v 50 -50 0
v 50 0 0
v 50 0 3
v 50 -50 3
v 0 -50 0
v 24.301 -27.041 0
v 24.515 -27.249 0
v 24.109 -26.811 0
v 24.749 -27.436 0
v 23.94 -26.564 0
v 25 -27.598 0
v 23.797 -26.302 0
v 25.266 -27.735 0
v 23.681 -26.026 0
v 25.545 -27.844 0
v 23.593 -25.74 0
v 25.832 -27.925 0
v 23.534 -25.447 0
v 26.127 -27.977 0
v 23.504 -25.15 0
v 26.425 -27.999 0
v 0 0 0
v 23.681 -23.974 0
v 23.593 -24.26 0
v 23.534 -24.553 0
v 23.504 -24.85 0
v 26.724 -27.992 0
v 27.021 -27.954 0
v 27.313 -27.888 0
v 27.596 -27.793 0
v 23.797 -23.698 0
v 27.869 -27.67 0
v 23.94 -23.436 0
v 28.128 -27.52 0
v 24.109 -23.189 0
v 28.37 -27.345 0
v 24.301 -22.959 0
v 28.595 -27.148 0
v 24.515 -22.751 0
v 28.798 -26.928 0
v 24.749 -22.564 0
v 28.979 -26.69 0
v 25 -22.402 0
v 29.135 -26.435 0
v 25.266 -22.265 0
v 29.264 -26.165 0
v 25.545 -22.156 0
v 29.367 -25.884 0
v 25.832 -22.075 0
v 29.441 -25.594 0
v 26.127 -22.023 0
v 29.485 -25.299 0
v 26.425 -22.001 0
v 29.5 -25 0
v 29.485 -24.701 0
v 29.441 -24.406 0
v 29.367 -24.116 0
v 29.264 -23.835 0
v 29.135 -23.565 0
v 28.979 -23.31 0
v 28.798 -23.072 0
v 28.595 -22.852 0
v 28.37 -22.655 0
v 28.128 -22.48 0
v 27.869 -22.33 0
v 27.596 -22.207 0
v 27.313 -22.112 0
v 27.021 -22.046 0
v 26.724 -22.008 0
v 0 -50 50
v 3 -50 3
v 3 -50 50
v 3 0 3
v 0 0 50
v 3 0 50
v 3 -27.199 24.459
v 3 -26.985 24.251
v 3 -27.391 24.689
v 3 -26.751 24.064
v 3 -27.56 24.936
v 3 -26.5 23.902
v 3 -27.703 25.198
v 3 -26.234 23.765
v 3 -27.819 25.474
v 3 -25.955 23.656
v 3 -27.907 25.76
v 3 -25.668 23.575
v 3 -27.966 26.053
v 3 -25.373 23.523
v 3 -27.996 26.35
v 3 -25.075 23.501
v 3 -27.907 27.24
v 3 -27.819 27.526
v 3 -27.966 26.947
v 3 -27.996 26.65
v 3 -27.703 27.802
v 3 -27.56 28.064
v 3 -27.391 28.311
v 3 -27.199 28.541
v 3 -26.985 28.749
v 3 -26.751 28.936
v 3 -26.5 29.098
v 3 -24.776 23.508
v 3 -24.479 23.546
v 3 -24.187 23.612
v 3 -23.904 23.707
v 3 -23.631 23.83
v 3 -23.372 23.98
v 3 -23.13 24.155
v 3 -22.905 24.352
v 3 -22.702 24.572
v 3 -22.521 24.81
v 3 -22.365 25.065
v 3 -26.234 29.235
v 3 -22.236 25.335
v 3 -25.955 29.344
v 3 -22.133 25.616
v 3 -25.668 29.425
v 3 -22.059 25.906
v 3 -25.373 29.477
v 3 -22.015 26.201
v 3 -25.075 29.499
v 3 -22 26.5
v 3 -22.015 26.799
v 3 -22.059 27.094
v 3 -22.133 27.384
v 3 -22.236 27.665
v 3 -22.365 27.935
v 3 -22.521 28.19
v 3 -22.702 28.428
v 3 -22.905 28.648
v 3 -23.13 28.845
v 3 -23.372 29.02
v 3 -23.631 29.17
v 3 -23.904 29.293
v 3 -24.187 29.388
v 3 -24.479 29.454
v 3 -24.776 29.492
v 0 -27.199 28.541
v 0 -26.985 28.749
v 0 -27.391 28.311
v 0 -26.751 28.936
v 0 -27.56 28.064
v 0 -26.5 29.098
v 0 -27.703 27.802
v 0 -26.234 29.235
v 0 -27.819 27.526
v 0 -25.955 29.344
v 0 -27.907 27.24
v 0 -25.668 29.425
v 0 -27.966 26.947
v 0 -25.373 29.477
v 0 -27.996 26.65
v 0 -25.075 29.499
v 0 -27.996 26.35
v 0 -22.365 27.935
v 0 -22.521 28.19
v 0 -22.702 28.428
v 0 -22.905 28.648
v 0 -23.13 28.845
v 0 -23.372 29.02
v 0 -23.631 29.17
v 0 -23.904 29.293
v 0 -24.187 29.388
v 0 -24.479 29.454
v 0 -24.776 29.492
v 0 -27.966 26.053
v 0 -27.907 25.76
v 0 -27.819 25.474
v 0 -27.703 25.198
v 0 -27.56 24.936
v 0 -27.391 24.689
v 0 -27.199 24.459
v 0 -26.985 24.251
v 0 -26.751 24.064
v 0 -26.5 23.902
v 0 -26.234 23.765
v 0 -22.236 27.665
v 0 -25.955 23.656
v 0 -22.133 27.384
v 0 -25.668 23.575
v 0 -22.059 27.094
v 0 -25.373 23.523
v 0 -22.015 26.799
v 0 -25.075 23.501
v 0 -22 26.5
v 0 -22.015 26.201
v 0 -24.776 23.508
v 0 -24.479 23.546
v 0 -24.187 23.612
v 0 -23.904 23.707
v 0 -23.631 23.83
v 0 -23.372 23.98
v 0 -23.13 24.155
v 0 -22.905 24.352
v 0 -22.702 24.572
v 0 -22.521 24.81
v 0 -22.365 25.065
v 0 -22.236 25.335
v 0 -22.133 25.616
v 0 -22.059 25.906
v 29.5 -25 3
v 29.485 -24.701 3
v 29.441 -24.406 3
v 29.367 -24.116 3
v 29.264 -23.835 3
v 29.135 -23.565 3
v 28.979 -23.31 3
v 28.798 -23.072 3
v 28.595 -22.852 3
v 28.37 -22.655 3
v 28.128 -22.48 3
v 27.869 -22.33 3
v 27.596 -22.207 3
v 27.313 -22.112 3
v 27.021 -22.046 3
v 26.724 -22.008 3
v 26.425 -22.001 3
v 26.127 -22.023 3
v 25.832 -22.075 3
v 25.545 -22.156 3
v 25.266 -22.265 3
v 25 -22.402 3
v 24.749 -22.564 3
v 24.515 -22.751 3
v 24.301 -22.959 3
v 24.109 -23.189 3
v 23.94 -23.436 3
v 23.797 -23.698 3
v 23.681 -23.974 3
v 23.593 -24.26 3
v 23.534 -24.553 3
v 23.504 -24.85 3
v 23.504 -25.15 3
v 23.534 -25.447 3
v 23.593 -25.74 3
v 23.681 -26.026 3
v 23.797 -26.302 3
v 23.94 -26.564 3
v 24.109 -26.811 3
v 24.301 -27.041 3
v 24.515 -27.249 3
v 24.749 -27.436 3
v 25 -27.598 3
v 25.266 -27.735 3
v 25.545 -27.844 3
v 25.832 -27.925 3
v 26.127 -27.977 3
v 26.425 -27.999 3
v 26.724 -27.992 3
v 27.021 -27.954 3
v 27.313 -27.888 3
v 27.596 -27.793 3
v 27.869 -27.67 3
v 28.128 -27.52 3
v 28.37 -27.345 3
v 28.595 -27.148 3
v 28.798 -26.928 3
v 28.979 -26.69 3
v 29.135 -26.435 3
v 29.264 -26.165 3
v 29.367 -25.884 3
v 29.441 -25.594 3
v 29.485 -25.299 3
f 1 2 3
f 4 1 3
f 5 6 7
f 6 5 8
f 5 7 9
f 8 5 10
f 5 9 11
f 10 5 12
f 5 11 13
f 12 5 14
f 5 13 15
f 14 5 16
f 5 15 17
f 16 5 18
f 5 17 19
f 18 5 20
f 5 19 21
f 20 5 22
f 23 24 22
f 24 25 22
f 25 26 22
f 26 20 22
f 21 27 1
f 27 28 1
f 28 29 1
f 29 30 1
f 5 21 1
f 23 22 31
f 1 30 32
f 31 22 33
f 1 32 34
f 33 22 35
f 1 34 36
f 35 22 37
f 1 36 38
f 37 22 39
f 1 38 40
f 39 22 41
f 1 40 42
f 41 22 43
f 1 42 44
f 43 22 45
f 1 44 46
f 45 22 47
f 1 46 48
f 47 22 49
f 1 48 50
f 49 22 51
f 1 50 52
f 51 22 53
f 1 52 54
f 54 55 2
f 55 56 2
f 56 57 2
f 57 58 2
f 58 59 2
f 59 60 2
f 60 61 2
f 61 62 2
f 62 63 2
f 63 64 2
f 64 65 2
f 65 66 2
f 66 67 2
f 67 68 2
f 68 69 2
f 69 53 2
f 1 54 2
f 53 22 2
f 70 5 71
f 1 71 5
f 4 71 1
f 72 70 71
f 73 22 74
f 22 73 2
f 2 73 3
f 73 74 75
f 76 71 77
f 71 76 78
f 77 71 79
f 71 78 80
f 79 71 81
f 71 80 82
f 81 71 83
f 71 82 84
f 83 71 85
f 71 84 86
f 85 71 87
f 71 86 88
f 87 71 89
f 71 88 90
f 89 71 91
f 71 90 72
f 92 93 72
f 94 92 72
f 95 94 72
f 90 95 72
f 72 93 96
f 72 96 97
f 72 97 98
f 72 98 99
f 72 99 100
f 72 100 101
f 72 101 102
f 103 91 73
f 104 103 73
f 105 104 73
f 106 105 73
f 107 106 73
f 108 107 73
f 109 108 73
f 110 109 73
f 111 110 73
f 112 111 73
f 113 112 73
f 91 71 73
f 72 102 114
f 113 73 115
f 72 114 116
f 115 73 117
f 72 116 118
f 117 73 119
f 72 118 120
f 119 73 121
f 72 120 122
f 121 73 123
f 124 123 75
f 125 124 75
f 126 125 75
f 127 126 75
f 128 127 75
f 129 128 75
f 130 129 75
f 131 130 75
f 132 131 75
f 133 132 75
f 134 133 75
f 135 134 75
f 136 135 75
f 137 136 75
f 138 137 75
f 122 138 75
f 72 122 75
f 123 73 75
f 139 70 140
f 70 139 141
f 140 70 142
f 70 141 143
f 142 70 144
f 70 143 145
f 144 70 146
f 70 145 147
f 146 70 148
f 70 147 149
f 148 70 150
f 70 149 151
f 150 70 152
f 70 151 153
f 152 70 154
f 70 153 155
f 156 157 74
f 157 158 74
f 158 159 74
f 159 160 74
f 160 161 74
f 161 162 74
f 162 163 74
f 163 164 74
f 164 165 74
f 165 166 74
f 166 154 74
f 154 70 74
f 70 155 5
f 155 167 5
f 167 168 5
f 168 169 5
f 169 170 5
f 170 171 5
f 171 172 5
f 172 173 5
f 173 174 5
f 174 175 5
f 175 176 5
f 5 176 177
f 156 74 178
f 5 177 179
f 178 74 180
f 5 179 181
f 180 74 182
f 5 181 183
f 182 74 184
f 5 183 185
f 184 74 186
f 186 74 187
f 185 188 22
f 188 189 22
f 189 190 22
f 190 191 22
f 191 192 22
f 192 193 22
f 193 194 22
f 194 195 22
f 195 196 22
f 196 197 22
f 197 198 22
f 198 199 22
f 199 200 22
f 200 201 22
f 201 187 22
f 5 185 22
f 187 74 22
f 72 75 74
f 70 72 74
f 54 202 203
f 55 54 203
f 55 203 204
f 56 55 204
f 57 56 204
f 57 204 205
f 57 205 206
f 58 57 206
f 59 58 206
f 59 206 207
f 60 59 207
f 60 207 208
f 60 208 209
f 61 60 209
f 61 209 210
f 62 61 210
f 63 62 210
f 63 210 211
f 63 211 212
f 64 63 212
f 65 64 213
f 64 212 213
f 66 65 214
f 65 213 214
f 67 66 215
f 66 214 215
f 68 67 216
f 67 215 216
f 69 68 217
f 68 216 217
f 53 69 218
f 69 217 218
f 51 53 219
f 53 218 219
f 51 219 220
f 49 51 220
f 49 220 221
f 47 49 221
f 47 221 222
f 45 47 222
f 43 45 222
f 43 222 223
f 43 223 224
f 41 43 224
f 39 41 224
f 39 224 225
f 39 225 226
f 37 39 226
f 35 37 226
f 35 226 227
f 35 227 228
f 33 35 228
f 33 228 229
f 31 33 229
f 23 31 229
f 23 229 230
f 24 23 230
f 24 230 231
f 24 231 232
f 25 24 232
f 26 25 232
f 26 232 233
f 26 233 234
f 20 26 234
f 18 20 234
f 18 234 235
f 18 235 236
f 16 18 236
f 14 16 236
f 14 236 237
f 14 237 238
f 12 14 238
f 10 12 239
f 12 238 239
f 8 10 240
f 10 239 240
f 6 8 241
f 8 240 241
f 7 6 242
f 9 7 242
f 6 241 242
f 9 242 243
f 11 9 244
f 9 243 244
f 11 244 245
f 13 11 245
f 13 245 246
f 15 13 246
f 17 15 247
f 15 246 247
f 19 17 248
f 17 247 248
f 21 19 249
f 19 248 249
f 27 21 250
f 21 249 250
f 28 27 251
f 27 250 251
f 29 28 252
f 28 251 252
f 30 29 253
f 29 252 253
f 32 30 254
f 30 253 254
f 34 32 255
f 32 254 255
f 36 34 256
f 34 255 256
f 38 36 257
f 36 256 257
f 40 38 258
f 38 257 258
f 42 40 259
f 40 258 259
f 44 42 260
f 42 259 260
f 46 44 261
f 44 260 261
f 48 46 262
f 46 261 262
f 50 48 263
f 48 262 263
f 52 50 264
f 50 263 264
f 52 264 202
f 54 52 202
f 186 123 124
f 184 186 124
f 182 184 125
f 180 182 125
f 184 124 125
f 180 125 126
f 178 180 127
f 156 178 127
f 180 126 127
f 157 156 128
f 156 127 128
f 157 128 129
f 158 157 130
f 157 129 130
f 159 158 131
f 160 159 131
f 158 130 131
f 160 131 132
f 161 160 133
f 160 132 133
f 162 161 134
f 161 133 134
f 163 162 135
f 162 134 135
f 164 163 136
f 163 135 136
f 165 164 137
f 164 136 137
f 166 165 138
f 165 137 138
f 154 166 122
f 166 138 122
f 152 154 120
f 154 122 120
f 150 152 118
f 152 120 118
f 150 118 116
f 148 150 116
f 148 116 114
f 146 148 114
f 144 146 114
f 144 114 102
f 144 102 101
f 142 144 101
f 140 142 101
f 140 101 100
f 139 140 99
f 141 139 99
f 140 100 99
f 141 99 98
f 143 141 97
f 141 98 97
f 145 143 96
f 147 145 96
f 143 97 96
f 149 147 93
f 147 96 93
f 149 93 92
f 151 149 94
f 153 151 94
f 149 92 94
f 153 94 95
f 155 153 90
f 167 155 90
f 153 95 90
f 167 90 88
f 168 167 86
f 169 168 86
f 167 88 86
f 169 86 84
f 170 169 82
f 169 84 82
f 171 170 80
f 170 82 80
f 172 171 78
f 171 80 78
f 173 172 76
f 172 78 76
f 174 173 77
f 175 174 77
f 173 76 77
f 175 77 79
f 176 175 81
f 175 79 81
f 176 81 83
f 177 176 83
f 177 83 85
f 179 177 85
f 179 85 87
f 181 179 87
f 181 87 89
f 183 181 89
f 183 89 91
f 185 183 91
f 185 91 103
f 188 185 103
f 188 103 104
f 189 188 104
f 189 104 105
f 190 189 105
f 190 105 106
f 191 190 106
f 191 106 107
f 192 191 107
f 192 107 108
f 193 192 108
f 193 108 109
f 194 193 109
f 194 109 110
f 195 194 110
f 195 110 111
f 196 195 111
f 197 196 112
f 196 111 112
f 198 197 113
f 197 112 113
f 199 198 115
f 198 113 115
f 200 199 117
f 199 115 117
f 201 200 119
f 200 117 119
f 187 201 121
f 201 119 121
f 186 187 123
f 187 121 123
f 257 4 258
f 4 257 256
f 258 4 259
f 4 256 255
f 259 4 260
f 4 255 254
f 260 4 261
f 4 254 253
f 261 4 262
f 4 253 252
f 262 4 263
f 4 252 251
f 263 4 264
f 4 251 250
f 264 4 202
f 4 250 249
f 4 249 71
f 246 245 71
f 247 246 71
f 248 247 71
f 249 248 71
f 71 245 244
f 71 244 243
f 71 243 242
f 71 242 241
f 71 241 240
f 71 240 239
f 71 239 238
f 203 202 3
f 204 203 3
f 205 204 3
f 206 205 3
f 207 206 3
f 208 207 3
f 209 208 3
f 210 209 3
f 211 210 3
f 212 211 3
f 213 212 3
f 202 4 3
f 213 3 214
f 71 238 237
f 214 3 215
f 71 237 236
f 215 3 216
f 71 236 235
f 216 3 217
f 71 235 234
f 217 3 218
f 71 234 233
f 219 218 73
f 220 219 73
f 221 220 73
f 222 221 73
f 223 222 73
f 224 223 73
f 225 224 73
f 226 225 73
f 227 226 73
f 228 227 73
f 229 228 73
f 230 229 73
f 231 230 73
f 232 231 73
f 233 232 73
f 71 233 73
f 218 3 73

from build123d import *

# Parameters (mm, degrees)
F1_DEPTH = 50
F2_R     = 3
F3_DEPTH = 3
F4_R     = 3
F5_DEPTH = 3.001


with BuildPart() as f1:
    # F0 (on Front) → F1 (new body)
    with BuildSketch(Plane.XZ):
        Polygon((0, 50), (0, 0), (50, 0), (50, 3), (3, 3), (3, 50), align=None)
    extrude(amount=F1_DEPTH)

    # F2 (on face) → F3 (cut, through all)
    with BuildSketch(Plane.YZ.offset(3)):
        with Locations((-25, 26.5)):
            Circle(F2_R)
    extrude(amount=-F3_DEPTH, mode=Mode.SUBTRACT)

    # F4 (on face) → F5 (cut, through all)
    with BuildSketch(Plane.XY.offset(3)):
        with Locations((26.5, -25)):
            Circle(F4_R)
    extrude(amount=-F5_DEPTH, mode=Mode.SUBTRACT)


solid = f1.part
